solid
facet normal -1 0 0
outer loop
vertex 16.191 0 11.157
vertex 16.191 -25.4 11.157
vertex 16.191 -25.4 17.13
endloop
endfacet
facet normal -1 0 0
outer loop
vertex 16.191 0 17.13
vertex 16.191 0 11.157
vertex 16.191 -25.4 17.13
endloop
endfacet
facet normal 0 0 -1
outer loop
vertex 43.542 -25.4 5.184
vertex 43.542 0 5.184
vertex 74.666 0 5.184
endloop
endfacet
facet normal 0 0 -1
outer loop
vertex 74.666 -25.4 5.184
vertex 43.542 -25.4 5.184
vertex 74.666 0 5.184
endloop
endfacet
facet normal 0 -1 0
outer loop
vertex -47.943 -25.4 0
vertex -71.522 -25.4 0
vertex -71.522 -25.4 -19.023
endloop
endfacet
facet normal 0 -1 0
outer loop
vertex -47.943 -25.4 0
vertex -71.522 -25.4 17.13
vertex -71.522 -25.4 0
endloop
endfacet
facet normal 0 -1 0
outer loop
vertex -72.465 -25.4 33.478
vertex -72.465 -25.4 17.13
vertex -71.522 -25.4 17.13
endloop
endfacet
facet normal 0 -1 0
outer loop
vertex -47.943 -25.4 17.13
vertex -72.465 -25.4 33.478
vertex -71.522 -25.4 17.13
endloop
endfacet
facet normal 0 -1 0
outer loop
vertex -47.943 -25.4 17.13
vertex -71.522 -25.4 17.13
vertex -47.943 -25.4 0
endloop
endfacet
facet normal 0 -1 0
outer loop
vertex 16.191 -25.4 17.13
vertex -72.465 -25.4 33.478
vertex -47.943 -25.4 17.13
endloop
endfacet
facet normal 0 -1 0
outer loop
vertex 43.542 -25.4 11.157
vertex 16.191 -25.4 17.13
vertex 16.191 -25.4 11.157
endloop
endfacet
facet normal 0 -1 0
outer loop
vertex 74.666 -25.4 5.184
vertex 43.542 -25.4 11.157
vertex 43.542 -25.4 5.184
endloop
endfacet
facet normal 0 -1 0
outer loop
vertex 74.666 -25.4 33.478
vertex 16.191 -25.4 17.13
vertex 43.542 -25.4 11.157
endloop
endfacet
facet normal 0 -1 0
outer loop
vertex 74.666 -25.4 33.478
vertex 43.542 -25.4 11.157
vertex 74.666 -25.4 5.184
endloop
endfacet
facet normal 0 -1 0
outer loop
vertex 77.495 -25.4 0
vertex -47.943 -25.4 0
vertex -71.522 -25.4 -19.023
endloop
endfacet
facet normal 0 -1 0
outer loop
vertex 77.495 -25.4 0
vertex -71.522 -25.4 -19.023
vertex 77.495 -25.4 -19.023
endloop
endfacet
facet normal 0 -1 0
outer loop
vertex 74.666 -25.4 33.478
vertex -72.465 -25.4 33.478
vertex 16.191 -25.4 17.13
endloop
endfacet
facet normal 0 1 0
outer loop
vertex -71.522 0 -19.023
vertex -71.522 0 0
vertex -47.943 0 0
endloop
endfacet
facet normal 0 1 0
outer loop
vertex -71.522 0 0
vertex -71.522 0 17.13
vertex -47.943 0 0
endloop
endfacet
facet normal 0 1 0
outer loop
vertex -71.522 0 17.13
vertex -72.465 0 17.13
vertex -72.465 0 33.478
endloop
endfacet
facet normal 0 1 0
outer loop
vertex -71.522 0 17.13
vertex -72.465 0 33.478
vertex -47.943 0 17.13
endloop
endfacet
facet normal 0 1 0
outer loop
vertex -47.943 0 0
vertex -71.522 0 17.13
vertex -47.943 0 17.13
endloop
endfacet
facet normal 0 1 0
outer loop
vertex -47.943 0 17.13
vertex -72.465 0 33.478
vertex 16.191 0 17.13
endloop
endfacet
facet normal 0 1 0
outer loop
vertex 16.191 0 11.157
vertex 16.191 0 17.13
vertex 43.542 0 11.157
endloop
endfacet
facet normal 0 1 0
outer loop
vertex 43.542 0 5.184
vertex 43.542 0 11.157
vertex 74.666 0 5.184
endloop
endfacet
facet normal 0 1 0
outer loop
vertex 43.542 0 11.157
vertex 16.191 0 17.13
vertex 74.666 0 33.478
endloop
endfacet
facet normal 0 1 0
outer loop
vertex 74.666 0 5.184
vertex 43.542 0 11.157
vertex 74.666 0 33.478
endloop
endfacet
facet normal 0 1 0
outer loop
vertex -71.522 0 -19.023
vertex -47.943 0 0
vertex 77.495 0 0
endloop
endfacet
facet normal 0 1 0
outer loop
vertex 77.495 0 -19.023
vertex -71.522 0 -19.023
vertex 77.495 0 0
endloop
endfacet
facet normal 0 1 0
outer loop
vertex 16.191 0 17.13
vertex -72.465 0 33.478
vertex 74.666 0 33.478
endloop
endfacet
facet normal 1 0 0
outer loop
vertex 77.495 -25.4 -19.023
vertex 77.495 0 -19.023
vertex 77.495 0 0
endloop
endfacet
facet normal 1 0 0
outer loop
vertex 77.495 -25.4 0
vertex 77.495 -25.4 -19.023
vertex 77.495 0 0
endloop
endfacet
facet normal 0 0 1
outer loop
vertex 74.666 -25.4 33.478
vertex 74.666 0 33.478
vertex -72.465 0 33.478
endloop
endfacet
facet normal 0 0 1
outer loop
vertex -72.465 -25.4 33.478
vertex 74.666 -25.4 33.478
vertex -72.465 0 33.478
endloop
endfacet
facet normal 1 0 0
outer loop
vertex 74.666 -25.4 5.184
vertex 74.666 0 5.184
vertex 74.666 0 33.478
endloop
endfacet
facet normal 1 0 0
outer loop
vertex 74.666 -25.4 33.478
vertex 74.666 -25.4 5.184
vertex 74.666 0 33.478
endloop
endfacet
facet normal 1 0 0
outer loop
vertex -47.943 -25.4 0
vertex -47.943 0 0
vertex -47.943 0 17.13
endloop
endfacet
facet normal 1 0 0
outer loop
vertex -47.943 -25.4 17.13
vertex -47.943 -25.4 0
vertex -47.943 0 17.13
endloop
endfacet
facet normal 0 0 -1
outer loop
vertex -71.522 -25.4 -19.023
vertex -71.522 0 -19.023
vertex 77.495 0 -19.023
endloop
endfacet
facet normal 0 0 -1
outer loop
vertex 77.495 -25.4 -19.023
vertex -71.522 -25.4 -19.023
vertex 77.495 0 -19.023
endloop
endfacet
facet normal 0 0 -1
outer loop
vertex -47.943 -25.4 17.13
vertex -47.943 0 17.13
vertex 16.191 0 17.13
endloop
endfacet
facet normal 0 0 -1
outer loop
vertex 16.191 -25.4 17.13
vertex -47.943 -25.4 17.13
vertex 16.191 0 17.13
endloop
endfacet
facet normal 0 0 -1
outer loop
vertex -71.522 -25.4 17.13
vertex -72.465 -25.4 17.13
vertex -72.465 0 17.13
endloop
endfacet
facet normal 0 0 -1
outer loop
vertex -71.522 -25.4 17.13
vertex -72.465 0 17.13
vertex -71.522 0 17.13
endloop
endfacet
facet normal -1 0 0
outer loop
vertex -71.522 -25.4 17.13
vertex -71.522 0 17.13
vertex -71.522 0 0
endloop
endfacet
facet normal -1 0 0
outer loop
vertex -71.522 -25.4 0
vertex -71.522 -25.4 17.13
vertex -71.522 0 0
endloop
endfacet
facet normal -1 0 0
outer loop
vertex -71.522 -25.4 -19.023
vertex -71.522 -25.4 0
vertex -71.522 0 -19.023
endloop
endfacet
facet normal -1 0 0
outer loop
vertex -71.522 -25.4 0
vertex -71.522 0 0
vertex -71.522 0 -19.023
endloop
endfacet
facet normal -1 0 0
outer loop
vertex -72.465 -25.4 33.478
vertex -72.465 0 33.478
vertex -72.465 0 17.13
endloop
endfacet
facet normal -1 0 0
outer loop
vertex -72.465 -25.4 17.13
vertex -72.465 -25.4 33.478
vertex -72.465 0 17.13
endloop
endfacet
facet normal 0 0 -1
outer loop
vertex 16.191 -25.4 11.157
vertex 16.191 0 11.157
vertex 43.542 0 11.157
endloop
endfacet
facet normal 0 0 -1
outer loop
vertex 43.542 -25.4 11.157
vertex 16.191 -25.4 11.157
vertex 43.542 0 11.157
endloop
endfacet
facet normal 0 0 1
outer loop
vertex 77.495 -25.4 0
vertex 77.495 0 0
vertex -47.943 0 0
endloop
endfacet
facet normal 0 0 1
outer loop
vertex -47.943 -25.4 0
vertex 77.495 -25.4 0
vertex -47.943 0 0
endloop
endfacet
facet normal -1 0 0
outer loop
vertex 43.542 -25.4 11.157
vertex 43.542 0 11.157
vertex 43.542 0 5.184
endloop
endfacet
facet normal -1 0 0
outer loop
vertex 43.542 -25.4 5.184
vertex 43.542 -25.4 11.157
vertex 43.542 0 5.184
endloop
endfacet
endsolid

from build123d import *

# Parameters (mm, degrees)
F0_W     = 23.5785879195
F0_H     = 17.130497843
F0_W_2   = 27.351161465
F0_H_2   = 5.9732412919
F1_DEPTH = 25.4


with BuildPart() as f1:
    # F0 (on Front) → F1 (new body)
    with BuildSketch(Plane.XZ):
        Polygon((-47.9431264102, 0), (-71.5217143297, 0), (-71.5217143297, -19.0233327448), (77.4949491024, -19.0233327448), (77.4949491024, 0), align=None)
        with Locations((-59.73242037, 8.5652489215)):
            Rectangle(F0_W, F0_H)
        Polygon((74.6655240655, 5.1840152591), (74.6655240655, 17.130497843), (43.5417890549, 17.130497843), (43.5417890549, 11.1572565511), (43.5417890549, 5.1840152591), align=None)
        with Locations((29.8662083223, 14.1438771971)):
            Rectangle(F0_W_2, F0_H_2)
        Polygon((-72.4648535252, 33.4783159196), (-72.4648535252, 17.130497843), (-71.5217143297, 17.130497843), (-47.9431264102, 17.130497843), (16.1906275898, 17.130497843), (43.5417890549, 17.130497843), (74.6655240655, 17.130497843), (74.6655240655, 33.4783159196), align=None)
    extrude(amount=F1_DEPTH)


solid = f1.part
